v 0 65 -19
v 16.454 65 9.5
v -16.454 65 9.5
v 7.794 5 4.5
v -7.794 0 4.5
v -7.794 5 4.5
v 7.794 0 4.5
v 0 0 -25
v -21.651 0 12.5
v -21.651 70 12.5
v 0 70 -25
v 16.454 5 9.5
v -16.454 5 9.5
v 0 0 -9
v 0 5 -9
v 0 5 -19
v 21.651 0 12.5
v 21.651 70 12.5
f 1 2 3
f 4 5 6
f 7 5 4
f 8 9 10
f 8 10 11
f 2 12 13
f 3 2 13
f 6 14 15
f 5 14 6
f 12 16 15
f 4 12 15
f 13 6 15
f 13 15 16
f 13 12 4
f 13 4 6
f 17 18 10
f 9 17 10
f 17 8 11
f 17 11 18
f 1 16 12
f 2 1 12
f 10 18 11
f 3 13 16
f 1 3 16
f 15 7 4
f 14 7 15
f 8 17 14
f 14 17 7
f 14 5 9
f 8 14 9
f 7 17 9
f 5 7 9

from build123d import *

# Parameters (mm, degrees)
EXTRUDE_1_DEPTH = 70
EXTRUDE_2_DEPTH = 5
EXTRUDE_3_DEPTH = 5


with BuildPart() as part:
    # 草图1 → 凸台-拉伸1 (new body)
    with BuildSketch(Plane(origin=(0, 0, 0), x_dir=(1, 0, 0), z_dir=(0, 1, 0))):
        Polygon((0, 25), (21.650635095, -12.5), (-21.650635095, -12.5), align=None)
        Polygon((-16.454482672, -9.5), (0, 19), (16.454482672, -9.5), align=None, mode=Mode.SUBTRACT)
    extrude(amount=EXTRUDE_1_DEPTH)

    # 草图2 → 凸台-拉伸2 (add)
    with BuildSketch(Plane(origin=(0, 70, 0), x_dir=(1, 0, 0), z_dir=(0, 1, 0))):
        Polygon((0, 19), (16.454482672, -9.5), (-16.454482672, -9.5), align=None)
    extrude(amount=-EXTRUDE_2_DEPTH)

    # 草图3 → 凸台-拉伸3 (add)
    with BuildSketch(Plane.XZ):
        Polygon((-16.454482672, 9.5), (16.454482672, 9.5), (0, -19), align=None)
        Polygon((0, -9), (-7.794228634, 4.5), (7.794228634, 4.5), align=None, mode=Mode.SUBTRACT)
    extrude(amount=-EXTRUDE_3_DEPTH)


solid = part.part
